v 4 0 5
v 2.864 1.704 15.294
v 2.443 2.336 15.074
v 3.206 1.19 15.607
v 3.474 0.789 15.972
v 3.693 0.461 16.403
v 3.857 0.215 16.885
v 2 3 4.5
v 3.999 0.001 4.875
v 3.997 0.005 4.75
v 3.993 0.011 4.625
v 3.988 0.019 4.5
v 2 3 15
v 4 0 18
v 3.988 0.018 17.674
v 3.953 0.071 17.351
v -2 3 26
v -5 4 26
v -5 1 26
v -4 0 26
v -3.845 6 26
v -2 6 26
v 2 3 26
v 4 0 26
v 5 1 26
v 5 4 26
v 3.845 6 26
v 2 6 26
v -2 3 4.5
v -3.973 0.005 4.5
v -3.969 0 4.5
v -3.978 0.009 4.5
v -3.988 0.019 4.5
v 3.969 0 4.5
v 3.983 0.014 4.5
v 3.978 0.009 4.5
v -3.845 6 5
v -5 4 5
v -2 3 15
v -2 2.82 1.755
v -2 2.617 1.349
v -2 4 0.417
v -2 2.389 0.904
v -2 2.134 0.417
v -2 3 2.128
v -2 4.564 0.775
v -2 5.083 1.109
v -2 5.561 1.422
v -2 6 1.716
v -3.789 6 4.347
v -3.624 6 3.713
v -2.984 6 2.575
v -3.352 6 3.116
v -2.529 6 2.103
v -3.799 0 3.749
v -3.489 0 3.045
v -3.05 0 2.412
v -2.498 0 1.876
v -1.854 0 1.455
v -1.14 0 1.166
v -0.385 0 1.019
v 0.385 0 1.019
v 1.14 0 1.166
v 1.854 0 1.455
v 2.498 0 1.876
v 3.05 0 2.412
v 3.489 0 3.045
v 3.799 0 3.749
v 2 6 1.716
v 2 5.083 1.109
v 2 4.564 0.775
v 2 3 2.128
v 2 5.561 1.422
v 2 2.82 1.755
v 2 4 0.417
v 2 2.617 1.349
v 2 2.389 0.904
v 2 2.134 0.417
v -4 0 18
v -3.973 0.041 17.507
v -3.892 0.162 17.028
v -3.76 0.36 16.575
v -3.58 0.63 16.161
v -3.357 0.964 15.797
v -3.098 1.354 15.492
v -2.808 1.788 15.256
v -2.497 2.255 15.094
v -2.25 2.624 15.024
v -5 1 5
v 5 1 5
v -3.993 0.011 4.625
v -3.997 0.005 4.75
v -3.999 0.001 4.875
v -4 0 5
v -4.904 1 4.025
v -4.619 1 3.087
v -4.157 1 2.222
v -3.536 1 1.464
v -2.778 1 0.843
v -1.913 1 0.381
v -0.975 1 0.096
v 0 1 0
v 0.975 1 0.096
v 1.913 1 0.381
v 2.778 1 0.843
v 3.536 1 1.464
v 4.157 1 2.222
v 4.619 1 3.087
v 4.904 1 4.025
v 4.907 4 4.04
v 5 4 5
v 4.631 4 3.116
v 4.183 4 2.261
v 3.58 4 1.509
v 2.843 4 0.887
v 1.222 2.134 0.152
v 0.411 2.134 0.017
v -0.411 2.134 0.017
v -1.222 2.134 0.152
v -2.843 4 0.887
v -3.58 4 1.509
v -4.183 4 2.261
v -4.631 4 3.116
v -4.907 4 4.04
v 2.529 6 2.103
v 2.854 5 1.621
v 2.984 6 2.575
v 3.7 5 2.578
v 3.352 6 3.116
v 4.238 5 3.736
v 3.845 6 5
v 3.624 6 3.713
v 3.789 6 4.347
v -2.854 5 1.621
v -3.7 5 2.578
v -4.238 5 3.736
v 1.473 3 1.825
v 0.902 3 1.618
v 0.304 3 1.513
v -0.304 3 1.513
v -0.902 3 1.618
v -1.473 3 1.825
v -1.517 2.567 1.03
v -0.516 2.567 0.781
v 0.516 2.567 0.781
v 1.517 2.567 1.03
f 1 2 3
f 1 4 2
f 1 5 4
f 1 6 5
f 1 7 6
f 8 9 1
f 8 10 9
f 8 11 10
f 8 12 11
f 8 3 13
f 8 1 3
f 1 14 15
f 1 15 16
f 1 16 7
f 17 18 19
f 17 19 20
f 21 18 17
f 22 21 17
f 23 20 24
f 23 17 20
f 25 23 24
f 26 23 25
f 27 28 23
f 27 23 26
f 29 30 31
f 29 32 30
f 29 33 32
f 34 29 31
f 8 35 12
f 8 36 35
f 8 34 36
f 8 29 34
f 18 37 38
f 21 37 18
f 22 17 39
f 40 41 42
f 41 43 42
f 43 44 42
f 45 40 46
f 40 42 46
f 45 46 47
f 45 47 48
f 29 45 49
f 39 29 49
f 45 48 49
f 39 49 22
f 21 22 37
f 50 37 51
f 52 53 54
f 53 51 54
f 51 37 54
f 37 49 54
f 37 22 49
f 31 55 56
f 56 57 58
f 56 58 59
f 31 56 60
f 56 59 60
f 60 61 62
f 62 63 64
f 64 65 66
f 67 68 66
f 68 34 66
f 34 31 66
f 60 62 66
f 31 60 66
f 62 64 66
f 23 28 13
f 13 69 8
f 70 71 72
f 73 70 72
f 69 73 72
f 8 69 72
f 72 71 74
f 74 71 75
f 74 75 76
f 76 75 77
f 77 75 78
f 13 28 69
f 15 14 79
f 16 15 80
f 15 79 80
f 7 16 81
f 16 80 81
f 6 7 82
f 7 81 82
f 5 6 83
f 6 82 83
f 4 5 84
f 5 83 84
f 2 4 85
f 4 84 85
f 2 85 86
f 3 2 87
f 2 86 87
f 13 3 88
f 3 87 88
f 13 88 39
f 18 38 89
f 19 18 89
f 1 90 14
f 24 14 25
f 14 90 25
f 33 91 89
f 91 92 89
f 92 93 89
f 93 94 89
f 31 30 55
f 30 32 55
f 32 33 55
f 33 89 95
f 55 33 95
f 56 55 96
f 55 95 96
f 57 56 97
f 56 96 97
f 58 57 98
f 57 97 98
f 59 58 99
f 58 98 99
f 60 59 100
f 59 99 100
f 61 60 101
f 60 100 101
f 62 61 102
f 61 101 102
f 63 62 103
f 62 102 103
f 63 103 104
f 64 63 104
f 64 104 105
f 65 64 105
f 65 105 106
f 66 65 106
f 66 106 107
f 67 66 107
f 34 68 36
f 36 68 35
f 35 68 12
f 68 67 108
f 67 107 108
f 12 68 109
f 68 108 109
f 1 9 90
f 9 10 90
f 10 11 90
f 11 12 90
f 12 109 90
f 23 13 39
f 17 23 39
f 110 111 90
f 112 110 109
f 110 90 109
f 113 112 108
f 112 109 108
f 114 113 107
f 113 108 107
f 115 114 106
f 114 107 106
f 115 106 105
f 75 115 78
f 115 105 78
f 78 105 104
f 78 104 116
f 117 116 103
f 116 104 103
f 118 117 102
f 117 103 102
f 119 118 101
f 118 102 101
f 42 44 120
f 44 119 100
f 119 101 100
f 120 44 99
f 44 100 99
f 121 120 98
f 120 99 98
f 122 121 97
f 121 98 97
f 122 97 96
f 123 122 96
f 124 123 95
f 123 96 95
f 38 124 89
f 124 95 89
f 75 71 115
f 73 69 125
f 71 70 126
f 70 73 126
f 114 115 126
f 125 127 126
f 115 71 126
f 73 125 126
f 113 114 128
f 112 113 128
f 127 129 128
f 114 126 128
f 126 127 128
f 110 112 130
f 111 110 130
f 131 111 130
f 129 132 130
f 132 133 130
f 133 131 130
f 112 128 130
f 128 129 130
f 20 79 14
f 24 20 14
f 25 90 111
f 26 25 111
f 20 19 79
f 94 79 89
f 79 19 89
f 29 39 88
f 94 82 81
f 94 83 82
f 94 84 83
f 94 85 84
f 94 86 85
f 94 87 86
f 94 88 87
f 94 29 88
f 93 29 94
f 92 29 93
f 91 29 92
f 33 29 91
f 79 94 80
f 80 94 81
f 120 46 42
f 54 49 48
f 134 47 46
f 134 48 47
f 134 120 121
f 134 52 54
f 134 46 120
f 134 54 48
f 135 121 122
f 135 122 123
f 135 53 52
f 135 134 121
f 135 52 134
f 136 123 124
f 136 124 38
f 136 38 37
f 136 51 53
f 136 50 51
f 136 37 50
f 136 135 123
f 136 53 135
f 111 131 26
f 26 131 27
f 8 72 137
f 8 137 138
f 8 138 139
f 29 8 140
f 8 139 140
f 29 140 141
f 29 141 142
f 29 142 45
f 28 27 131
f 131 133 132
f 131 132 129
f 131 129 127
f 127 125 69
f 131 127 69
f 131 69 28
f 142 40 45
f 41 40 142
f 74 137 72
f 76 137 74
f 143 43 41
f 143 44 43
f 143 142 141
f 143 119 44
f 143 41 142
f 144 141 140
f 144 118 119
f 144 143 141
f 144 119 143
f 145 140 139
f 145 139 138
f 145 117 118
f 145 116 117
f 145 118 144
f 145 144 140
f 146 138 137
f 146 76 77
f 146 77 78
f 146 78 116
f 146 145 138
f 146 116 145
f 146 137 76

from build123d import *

# Parameters (mm, degrees)
EXTRUDE2_DEPTH                 = 26
CUT_EXTRUDE3_DEPTH             = 28.147743921
CHAMFER1_SIZE                  = 1
CHAMFER2_SIZE2                 = 1.154700538
CHAMFER2_SIZE                  = 2
CHAMFER3_SIZE2                 = 1.154700538
CHAMFER3_SIZE                  = 2
CHAMFER4_SIZE                  = 1.5
CHAMFER4_SIZE2                 = 0.866025404
CUT_EXTRUDE5_REACH             = 29.148
CUT_EXTRUDE5_DIRECTION_2_REACH = 29.148
CUT_EXTRUDE6_START             = 4.5
CUT_EXTRUDE6_DEPTH             = 10.5
CUT_EXTRUDE6_START_2           = 15
CUT_EXTRUDE6_2_DEPTH           = 3
CUT_EXTRUDE6_START_3           = -4
CUT_EXTRUDE6_3_DEPTH           = 8


with BuildPart() as part:
    # Sketch1 → Extrude2 (new body)
    with BuildSketch(Plane.XY):
        Polygon((-5, 0), (5, 0), (5, 6), (2, 6), (2, 3), (-2, 3), (-2, 6), (-5, 6), align=None)
    extrude(amount=EXTRUDE2_DEPTH)

    # Sketch2 → Cut-Extrude3 (cut, through all)
    with BuildSketch(Plane(origin=(0, 0, 0), x_dir=(1, 0, 0), z_dir=(0, 1, 0))):
        with BuildLine():
            Line((-5, 1), (5, 1))
            Line((5, 1), (5, -5))
            ThreePointArc((5, -5), (0, 0), (-5, -5))
            Line((-5, -5), (-5, 1))
        make_face()
    extrude(amount=CUT_EXTRUDE3_DEPTH, mode=Mode.SUBTRACT)

    # Chamfer1
    chamfer1_edges = [part.edges().sort_by_distance(p)[0] for p in [
        (5, 0, 15.5),
        (-5, 0, 15.5),
        (0, 0, 0),
    ]]
    chamfer(chamfer1_edges, length=CHAMFER1_SIZE)

    # Chamfer2
    chamfer2_edges = [part.edges().sort_by_distance(p)[0] for p in [
        (5, 6, 15.5),
        (4.183300133, 6, 2.261387212),
    ]]
    chamfer(chamfer2_edges, length=CHAMFER2_SIZE, length2=CHAMFER2_SIZE2)

    # Chamfer3
    chamfer3_edges = [part.edges().sort_by_distance(p)[0] for p in [
        (-5, 6, 15.5),
        (-4.183300133, 6, 2.261387212),
    ]]
    chamfer(chamfer3_edges, length=CHAMFER3_SIZE, length2=CHAMFER3_SIZE2)

    # Chamfer4
    chamfer4_edges = [part.edges().sort_by_distance(p)[0] for p in [
        (0, 3, 0),
    ]]
    chamfer4_side = [part.faces().sort_by_distance(p)[0] for p in [
        (0, 3, 13.068070345),
    ]]
    chamfer(chamfer4_edges, length=CHAMFER4_SIZE, length2=CHAMFER4_SIZE2, reference=chamfer4_side[0])

    # Cut-Extrude5: up to this face of the body (flat: up to its plane)
    cut_extrude5_end = Plane(part.part.faces().sort_by_distance((-2, 4.468849855, 13.300187557))[0])
    # Sketch5 → Cut-Extrude5 (cut, up to the picked face)
    with BuildSketch(Plane(origin=(0, 0, 0), x_dir=(0, 0, -1), z_dir=(1, 0, 0)), mode=Mode.PRIVATE) as cut_extrude5_sk1:
        with BuildLine():
            Line((-15, 3), (-14, 3))
            Line((-14, 3), (-14, 0))
            Line((-14, 0), (-18, 0))
            ThreePointArc((-18, 0), (-15.878679656, 0.878679656), (-15, 3))
        make_face()
    cut_extrude5_tool1 = split(extrude(cut_extrude5_sk1.sketch, amount=-CUT_EXTRUDE5_REACH, mode=Mode.PRIVATE), bisect_by=cut_extrude5_end, keep=Keep.BOTH, mode=Mode.PRIVATE)
    add(cut_extrude5_tool1.solids().sort_by(Axis((0, 1.174967, 14.958278), (-1, 0, 0)))[0], mode=Mode.SUBTRACT)

    # Cut-Extrude5 direction 2: up to this face of the body (flat: up to its plane)
    cut_extrude5_direction_2_end = Plane(part.part.faces().sort_by_distance((2, 4.468849855, 13.300187557))[0])
    # Sketch5 → Cut-Extrude5 direction 2 (cut, up to the picked face)
    with BuildSketch(Plane(origin=(0, 0, 0), x_dir=(0, 0, -1), z_dir=(1, 0, 0)), mode=Mode.PRIVATE) as cut_extrude5_direction_2_sk1:
        with BuildLine():
            Line((-15, 3), (-14, 3))
            Line((-14, 3), (-14, 0))
            Line((-14, 0), (-18, 0))
            ThreePointArc((-18, 0), (-15.878679656, 0.878679656), (-15, 3))
        make_face()
    cut_extrude5_direction_2_tool1 = split(extrude(cut_extrude5_direction_2_sk1.sketch, amount=CUT_EXTRUDE5_DIRECTION_2_REACH, mode=Mode.PRIVATE), bisect_by=cut_extrude5_direction_2_end, keep=Keep.BOTH, mode=Mode.PRIVATE)
    add(cut_extrude5_direction_2_tool1.solids().sort_by(Axis((0, 1.174967, 14.958278), (1, 0, 0)))[0], mode=Mode.SUBTRACT)

    # Cut-Extrude6: read off the stored shape, not the designer's step
    # Cut-Extrude6 outline → Cut-Extrude6 (cut)
    with BuildSketch(Plane.XY.offset(CUT_EXTRUDE6_START)):
        Polygon((-2, 3), (-4, 0), (4, 0), (2, 3), align=None)
    extrude(amount=CUT_EXTRUDE6_DEPTH, mode=Mode.SUBTRACT)

    # Cut-Extrude6 2 outline → Cut-Extrude6 2 (cut)
    with BuildSketch(Plane.XY.offset(CUT_EXTRUDE6_START_2)):
        Polygon((2, 3), (2, 0), (4, 0), align=None)
        Polygon((-2, 3), (-4, 0), (-2, 0), align=None)
    extrude(amount=CUT_EXTRUDE6_2_DEPTH, mode=Mode.SUBTRACT)

    # Cut-Extrude6 3 outline → Cut-Extrude6 3 (add)
    with BuildSketch(Plane.YZ.offset(CUT_EXTRUDE6_START_3)):
        with BuildLine():
            ThreePointArc((0, 18), (0.878679656, 15.878679656), (3, 15))
            Line((3, 15), (3, 18))
            Line((3, 18), (0, 18))
        make_face()
    extrude(amount=CUT_EXTRUDE6_3_DEPTH)


solid = part.part
